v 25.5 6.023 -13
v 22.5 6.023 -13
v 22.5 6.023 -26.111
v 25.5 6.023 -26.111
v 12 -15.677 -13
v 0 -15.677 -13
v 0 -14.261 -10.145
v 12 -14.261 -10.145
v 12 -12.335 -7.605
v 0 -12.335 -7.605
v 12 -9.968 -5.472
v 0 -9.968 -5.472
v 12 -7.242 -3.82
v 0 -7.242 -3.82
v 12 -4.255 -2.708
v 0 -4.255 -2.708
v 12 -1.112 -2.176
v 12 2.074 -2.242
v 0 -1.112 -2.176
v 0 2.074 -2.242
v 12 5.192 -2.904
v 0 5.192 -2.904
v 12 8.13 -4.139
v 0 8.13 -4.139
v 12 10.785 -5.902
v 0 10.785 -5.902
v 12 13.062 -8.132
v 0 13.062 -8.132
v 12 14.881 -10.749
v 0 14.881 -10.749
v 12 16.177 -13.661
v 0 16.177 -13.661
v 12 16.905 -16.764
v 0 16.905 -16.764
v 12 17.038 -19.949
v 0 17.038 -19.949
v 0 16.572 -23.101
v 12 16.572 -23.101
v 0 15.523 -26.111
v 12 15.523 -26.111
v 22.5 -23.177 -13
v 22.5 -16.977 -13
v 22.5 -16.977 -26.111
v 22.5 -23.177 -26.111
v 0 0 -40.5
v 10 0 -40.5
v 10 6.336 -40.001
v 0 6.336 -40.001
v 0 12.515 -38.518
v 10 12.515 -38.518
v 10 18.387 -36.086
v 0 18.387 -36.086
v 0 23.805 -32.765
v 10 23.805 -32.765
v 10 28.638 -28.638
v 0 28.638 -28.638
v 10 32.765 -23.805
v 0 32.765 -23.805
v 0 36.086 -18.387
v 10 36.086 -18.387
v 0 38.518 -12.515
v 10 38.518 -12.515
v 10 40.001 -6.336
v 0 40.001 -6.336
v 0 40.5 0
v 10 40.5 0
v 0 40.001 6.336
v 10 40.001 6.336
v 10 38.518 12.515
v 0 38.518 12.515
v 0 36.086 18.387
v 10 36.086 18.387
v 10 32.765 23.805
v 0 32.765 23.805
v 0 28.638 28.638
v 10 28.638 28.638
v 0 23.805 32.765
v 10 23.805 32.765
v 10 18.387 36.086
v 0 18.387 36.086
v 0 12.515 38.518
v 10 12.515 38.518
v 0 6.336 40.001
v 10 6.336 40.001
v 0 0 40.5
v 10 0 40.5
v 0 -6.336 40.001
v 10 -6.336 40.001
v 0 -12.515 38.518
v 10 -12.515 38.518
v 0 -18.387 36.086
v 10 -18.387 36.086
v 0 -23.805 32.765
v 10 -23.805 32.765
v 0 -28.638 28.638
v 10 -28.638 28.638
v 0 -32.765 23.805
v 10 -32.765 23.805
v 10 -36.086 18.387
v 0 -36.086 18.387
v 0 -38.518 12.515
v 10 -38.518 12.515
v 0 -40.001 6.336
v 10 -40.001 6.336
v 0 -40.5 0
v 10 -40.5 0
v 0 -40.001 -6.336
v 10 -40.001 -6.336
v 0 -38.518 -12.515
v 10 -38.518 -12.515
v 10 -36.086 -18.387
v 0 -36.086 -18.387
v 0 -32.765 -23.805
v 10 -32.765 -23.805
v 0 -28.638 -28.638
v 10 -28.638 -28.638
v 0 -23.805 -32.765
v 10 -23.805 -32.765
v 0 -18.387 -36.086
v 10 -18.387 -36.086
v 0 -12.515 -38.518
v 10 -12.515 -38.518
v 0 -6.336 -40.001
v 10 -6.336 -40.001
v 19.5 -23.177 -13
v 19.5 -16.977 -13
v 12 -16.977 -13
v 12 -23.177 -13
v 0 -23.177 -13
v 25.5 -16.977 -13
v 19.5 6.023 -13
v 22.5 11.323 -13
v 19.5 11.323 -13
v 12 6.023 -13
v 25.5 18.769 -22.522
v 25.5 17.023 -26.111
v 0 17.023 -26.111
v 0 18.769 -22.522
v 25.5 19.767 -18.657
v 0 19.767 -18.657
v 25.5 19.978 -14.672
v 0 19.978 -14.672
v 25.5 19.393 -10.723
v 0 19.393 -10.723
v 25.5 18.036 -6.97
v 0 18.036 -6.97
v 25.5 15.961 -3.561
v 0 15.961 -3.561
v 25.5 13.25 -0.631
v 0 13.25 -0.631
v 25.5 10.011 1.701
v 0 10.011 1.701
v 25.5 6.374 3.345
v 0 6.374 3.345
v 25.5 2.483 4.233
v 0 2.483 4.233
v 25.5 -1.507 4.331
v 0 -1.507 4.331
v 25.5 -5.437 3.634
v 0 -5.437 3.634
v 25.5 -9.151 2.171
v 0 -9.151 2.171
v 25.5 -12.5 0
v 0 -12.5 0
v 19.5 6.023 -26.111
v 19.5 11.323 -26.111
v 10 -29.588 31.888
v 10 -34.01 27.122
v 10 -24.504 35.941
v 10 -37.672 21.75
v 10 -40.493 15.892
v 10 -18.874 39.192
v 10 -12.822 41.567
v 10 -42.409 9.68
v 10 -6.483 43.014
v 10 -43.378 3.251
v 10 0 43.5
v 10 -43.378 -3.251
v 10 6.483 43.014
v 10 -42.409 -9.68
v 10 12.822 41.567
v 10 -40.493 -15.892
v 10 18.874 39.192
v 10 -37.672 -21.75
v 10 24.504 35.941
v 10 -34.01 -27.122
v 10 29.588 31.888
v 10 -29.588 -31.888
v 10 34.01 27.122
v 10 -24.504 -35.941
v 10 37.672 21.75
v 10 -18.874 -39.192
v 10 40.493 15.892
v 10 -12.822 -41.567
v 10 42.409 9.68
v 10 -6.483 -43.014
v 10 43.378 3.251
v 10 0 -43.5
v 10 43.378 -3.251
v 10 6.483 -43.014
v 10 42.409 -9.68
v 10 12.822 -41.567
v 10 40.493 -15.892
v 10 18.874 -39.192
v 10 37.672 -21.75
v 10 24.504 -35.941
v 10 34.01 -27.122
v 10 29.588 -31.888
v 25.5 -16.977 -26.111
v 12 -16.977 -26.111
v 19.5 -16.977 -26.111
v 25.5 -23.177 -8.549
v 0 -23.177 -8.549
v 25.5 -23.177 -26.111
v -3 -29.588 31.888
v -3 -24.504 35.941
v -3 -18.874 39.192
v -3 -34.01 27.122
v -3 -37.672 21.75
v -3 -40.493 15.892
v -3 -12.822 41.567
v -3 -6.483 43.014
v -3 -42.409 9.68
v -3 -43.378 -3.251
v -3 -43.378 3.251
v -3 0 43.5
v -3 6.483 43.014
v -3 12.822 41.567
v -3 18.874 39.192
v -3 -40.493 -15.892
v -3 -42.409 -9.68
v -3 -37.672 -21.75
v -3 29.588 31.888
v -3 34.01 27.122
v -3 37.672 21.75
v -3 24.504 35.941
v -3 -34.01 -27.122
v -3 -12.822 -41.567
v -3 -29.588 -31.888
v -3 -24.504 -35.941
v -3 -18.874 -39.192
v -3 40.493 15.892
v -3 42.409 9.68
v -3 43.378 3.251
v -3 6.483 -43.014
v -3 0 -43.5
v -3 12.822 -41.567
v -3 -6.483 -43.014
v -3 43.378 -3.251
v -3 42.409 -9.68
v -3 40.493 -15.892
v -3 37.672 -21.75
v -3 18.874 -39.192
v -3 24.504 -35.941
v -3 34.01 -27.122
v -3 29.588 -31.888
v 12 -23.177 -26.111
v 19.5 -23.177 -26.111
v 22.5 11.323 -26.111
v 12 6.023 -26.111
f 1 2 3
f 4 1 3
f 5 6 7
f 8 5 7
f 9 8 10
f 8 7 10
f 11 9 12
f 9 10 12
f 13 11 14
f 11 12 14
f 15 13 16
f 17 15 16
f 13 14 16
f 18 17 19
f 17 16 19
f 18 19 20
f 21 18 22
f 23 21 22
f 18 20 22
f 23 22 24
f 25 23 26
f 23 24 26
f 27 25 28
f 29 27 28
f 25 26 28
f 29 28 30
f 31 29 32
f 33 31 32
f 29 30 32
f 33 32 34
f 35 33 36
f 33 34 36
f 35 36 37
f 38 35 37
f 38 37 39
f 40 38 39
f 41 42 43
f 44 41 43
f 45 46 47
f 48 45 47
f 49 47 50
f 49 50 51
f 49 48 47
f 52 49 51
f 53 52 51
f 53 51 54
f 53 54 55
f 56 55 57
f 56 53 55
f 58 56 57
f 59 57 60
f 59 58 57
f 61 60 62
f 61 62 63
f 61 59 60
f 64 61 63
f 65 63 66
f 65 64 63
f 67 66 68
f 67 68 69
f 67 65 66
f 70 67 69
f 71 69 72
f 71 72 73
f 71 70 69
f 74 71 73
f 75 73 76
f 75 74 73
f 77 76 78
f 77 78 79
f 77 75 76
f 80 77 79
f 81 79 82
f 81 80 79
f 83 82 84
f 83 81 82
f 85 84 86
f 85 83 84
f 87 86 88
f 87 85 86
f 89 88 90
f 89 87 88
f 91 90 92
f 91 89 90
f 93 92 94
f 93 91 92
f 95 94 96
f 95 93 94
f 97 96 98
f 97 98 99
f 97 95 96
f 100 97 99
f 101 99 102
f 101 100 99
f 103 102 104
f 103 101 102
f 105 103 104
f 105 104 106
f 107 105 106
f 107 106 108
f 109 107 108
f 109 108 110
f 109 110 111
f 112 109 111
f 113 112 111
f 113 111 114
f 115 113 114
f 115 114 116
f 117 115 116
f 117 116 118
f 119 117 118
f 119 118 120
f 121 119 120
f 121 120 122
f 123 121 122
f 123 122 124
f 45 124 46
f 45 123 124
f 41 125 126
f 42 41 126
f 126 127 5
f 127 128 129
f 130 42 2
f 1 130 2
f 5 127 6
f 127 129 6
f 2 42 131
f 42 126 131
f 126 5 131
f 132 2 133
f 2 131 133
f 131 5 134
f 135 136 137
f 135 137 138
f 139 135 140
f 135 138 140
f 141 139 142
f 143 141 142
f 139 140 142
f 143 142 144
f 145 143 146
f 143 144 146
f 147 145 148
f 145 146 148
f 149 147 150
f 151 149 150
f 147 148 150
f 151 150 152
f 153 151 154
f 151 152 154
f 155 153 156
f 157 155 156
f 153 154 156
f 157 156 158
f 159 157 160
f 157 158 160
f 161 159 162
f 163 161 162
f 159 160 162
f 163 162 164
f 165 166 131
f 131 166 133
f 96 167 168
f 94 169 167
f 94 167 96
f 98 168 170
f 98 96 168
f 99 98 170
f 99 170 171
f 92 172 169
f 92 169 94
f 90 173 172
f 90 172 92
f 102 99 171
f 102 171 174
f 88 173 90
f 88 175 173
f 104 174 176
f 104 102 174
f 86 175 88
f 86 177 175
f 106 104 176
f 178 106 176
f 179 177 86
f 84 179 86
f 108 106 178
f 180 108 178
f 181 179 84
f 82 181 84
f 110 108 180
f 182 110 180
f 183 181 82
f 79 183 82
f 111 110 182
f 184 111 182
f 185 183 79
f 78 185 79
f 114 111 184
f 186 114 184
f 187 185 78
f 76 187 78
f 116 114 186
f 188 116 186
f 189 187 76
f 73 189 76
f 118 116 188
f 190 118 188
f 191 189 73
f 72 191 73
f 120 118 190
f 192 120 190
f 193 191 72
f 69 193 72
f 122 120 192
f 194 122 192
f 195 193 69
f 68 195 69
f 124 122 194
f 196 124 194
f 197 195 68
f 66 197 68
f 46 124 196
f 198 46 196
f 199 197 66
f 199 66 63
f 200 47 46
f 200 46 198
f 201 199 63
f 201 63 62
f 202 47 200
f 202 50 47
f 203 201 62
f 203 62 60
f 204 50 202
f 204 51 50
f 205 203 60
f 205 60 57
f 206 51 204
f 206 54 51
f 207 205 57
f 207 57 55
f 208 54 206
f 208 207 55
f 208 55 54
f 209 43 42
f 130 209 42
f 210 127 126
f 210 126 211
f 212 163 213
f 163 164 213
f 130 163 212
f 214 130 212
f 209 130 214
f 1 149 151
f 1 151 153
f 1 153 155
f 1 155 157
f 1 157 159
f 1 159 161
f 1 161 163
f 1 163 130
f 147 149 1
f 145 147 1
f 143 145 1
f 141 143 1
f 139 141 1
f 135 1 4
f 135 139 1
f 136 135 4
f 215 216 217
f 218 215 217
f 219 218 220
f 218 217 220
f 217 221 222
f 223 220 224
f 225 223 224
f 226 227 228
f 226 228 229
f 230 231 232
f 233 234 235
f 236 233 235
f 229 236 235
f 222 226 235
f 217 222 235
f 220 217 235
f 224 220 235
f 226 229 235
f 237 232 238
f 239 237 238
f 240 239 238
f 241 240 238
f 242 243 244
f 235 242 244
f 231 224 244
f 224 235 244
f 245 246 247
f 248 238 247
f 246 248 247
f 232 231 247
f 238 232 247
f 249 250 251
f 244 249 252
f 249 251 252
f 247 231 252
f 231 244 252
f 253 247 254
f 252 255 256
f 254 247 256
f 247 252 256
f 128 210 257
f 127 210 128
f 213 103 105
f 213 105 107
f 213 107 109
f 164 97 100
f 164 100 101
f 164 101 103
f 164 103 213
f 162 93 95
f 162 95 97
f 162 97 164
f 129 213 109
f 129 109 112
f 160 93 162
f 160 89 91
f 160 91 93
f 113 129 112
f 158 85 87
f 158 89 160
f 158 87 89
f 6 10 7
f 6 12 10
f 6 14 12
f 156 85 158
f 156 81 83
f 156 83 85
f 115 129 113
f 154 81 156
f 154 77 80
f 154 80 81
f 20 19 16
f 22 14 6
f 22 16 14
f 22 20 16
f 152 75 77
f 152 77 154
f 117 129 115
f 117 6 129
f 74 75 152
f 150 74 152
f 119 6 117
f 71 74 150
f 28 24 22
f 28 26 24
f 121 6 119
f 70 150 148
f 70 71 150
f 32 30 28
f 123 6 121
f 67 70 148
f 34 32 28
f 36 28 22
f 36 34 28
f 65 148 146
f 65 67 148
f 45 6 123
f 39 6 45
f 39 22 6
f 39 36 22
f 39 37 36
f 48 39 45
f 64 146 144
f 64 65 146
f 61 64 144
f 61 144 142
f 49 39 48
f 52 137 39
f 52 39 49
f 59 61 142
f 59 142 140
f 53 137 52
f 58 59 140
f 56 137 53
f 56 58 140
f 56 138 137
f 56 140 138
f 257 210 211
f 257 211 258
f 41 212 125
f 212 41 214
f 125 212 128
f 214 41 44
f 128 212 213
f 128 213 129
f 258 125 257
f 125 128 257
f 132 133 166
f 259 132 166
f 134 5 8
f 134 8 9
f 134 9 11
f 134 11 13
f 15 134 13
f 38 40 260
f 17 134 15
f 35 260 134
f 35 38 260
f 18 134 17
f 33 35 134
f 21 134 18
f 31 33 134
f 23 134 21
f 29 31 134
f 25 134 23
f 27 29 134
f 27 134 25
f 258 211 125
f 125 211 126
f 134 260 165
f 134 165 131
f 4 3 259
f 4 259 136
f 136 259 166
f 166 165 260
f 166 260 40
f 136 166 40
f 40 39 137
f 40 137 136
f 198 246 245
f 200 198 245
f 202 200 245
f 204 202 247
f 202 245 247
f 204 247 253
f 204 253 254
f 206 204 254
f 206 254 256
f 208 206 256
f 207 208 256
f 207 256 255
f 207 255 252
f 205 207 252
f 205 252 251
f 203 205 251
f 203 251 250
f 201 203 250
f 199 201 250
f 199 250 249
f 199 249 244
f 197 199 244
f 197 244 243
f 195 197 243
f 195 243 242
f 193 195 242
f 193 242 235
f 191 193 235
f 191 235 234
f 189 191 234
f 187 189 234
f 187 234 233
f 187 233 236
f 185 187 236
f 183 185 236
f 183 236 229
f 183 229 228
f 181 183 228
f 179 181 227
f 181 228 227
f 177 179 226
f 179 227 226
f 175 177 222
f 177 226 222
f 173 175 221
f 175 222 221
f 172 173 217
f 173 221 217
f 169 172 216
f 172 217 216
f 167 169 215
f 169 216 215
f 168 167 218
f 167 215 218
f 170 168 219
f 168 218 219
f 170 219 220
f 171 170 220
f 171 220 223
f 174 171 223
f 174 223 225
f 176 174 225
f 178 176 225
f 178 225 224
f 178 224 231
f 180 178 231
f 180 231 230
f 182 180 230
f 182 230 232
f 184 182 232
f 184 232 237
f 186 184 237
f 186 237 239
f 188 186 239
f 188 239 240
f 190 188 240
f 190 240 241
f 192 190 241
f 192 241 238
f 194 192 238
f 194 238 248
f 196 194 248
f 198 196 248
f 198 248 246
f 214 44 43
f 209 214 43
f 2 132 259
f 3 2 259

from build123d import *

# Parameters (mm, degrees)
ESQUISSE2_R        = 43.50000000000001
ESQUISSE2_R_2      = 40.5
BOSS_EXTRU_1_DEPTH = 10
BOSS_EXTRU_2_START = -3
ESQUISSE2_2_R      = 43.50000000000001
BOSS_EXTRU_2_DEPTH = 3
BOSS_EXTRU_3_DEPTH = 12
BOSS_EXTRU_4_START = 12
BOSS_EXTRU_4_DEPTH = 7.5
BOSS_EXTRU_5_START = 19.5
BOSS_EXTRU_5_DEPTH = 3
BOSS_EXTRU_6_START = 22.5
BOSS_EXTRU_6_DEPTH = 3


with BuildPart() as part:
    # Esquisse2 → Boss.-Extru.1 (new body)
    with BuildSketch(Plane(origin=(0, 0, 0), x_dir=(0, 0, -1), z_dir=(1, 0, 0))):
        Circle(ESQUISSE2_R)
        Circle(ESQUISSE2_R_2, mode=Mode.SUBTRACT)
    extrude(amount=BOSS_EXTRU_1_DEPTH)

    # Esquisse2<2> → Boss.-Extru.2 (add)
    with BuildSketch(Plane(origin=(0, 0, 0), x_dir=(0, 0, -1), z_dir=(1, 0, 0)).offset(BOSS_EXTRU_2_START)):
        Circle(ESQUISSE2_2_R)
    extrude(amount=BOSS_EXTRU_2_DEPTH)

    # Esquisse3 → Boss.-Extru.3 (add)
    with BuildSketch(Plane(origin=(0, 0, 0), x_dir=(0, 0, -1), z_dir=(1, 0, 0))):
        with BuildLine():
            Line((26.11118120318316, 15.522854869939358), (26.11118120318316, 17.022854869939355))
            ThreePointArc((26.111181203183165, 17.02285486993936), (12.199019622456863, 19.70655185145899), (3.55e-15, 12.500000000000004))
            ThreePointArc((3.55e-15, 12.500000000000002), (-4.387505004004, 4.4e-16), (5.33e-15, -12.5))
            Line((3.55e-15, -12.5), (8.54855768792795, -23.17714513006065))
            Line((8.54855768792795, -23.17714513006065), (13.000000000000005, -23.17714513006065))
            Line((13.000000000000005, -23.177145130060648), (13.000000000000004, -16.97714513006065))
            Line((13.000000000000004, -16.97714513006065), (13.000000000000004, -15.677145130060648))
            ThreePointArc((13.000000000000004, -15.677145130060646), (3.4519983220891106, 6.690070139129679), (26.111181203183158, 15.522854869939358))
        make_face()
    extrude(amount=BOSS_EXTRU_3_DEPTH)

    # Esquisse3<3> → Boss.-Extru.4 (add)
    with BuildSketch(Plane(origin=(0, 0, 0), x_dir=(0, 0, -1), z_dir=(1, 0, 0)).offset(BOSS_EXTRU_4_START)):
        with BuildLine():
            Line((26.11118120318316, 17.022854869939355), (26.11118120318316, 6.022854869939354))
            Line((26.11118120318316, 6.022854869939354), (13, 6.022854869939352))
            Line((13, 6.022854869939352), (13.000000000000004, -16.97714513006065))
            Line((13.000000000000004, -16.97714513006065), (26.111181203183165, -16.97714513006065))
            Line((26.111181203183165, -16.97714513006065), (26.11118120318317, -23.177145130060648))
            Line((26.11118120318317, -23.177145130060648), (8.54855768792795, -23.17714513006065))
            Line((8.54855768792795, -23.17714513006065), (3.37e-15, -12.5))
            ThreePointArc((3.37e-15, -12.5), (-4.387505004004002, -2.45e-15), (3.37e-15, 12.5))
            ThreePointArc((3.37e-15, 12.5), (12.199019622456856, 19.70655185145899), (26.11118120318316, 17.022854869939355))
        make_face()
    extrude(amount=BOSS_EXTRU_4_DEPTH)

    # Esquisse3<4> → Boss.-Extru.5 (add)
    with BuildSketch(Plane(origin=(0, 0, 0), x_dir=(0, 0, -1), z_dir=(1, 0, 0)).offset(BOSS_EXTRU_5_START)):
        with BuildLine():
            Line((26.11118120318316, 11.322854869939354), (26.11118120318316, 15.522854869939358))
            ThreePointArc((26.111181203183158, 15.522854869939358), (3.4519983220891106, 6.690070139129679), (13.000000000000004, -15.677145130060646))
            Line((13.000000000000004, -15.677145130060648), (13, 6.022854869939352))
            Line((13, 6.022854869939352), (13, 11.322854869939354))
            Line((13, 11.322854869939354), (26.11118120318316, 11.322854869939354))
        make_face()
        with BuildLine():
            Line((26.11118120318316, 15.522854869939358), (26.11118120318316, 17.022854869939355))
            ThreePointArc((26.111181203183165, 17.02285486993936), (12.199019622456863, 19.70655185145899), (3.55e-15, 12.500000000000004))
            ThreePointArc((3.55e-15, 12.500000000000002), (-4.387505004004, 4.4e-16), (5.33e-15, -12.5))
            Line((3.55e-15, -12.5), (8.54855768792795, -23.17714513006065))
            Line((8.54855768792795, -23.17714513006065), (13.000000000000005, -23.17714513006065))
            Line((13.000000000000005, -23.177145130060648), (13.000000000000004, -16.97714513006065))
            Line((13.000000000000004, -16.97714513006065), (13.000000000000004, -15.677145130060648))
            ThreePointArc((13.000000000000004, -15.677145130060646), (3.4519983220891106, 6.690070139129679), (26.111181203183158, 15.522854869939358))
        make_face()
    extrude(amount=BOSS_EXTRU_5_DEPTH)

    # Esquisse3<5> → Boss.-Extru.6 (add)
    with BuildSketch(Plane(origin=(0, 0, 0), x_dir=(0, 0, -1), z_dir=(1, 0, 0)).offset(BOSS_EXTRU_6_START)):
        Polygon((26.111181203183165, -16.97714513006065), (13.000000000000004, -16.97714513006065), (13.000000000000005, -23.177145130060648), (26.11118120318317, -23.177145130060648), align=None)
        with BuildLine():
            Line((26.11118120318316, 15.522854869939358), (26.11118120318316, 17.022854869939355))
            ThreePointArc((26.111181203183165, 17.02285486993936), (12.199019622456863, 19.70655185145899), (3.55e-15, 12.500000000000004))
            ThreePointArc((3.55e-15, 12.500000000000002), (-4.387505004004, 4.4e-16), (5.33e-15, -12.5))
            Line((3.55e-15, -12.5), (8.54855768792795, -23.17714513006065))
            Line((8.54855768792795, -23.17714513006065), (13.000000000000005, -23.17714513006065))
            Line((13.000000000000005, -23.177145130060648), (13.000000000000004, -16.97714513006065))
            Line((13.000000000000004, -16.97714513006065), (13.000000000000004, -15.677145130060648))
            ThreePointArc((13.000000000000004, -15.677145130060646), (3.4519983220891106, 6.690070139129679), (26.111181203183158, 15.522854869939358))
        make_face()
        with BuildLine():
            Line((26.11118120318316, 11.322854869939354), (26.11118120318316, 15.522854869939358))
            ThreePointArc((26.111181203183158, 15.522854869939358), (3.4519983220891106, 6.690070139129679), (13.000000000000004, -15.677145130060646))
            Line((13.000000000000004, -15.677145130060648), (13, 6.022854869939352))
            Line((13, 6.022854869939352), (13, 11.322854869939354))
            Line((13, 11.322854869939354), (26.11118120318316, 11.322854869939354))
        make_face()
        Polygon((26.11118120318316, 6.022854869939355), (26.11118120318316, 11.322854869939354), (13, 11.322854869939354), (13, 6.022854869939352), align=None)
    extrude(amount=BOSS_EXTRU_6_DEPTH)


solid = part.part
